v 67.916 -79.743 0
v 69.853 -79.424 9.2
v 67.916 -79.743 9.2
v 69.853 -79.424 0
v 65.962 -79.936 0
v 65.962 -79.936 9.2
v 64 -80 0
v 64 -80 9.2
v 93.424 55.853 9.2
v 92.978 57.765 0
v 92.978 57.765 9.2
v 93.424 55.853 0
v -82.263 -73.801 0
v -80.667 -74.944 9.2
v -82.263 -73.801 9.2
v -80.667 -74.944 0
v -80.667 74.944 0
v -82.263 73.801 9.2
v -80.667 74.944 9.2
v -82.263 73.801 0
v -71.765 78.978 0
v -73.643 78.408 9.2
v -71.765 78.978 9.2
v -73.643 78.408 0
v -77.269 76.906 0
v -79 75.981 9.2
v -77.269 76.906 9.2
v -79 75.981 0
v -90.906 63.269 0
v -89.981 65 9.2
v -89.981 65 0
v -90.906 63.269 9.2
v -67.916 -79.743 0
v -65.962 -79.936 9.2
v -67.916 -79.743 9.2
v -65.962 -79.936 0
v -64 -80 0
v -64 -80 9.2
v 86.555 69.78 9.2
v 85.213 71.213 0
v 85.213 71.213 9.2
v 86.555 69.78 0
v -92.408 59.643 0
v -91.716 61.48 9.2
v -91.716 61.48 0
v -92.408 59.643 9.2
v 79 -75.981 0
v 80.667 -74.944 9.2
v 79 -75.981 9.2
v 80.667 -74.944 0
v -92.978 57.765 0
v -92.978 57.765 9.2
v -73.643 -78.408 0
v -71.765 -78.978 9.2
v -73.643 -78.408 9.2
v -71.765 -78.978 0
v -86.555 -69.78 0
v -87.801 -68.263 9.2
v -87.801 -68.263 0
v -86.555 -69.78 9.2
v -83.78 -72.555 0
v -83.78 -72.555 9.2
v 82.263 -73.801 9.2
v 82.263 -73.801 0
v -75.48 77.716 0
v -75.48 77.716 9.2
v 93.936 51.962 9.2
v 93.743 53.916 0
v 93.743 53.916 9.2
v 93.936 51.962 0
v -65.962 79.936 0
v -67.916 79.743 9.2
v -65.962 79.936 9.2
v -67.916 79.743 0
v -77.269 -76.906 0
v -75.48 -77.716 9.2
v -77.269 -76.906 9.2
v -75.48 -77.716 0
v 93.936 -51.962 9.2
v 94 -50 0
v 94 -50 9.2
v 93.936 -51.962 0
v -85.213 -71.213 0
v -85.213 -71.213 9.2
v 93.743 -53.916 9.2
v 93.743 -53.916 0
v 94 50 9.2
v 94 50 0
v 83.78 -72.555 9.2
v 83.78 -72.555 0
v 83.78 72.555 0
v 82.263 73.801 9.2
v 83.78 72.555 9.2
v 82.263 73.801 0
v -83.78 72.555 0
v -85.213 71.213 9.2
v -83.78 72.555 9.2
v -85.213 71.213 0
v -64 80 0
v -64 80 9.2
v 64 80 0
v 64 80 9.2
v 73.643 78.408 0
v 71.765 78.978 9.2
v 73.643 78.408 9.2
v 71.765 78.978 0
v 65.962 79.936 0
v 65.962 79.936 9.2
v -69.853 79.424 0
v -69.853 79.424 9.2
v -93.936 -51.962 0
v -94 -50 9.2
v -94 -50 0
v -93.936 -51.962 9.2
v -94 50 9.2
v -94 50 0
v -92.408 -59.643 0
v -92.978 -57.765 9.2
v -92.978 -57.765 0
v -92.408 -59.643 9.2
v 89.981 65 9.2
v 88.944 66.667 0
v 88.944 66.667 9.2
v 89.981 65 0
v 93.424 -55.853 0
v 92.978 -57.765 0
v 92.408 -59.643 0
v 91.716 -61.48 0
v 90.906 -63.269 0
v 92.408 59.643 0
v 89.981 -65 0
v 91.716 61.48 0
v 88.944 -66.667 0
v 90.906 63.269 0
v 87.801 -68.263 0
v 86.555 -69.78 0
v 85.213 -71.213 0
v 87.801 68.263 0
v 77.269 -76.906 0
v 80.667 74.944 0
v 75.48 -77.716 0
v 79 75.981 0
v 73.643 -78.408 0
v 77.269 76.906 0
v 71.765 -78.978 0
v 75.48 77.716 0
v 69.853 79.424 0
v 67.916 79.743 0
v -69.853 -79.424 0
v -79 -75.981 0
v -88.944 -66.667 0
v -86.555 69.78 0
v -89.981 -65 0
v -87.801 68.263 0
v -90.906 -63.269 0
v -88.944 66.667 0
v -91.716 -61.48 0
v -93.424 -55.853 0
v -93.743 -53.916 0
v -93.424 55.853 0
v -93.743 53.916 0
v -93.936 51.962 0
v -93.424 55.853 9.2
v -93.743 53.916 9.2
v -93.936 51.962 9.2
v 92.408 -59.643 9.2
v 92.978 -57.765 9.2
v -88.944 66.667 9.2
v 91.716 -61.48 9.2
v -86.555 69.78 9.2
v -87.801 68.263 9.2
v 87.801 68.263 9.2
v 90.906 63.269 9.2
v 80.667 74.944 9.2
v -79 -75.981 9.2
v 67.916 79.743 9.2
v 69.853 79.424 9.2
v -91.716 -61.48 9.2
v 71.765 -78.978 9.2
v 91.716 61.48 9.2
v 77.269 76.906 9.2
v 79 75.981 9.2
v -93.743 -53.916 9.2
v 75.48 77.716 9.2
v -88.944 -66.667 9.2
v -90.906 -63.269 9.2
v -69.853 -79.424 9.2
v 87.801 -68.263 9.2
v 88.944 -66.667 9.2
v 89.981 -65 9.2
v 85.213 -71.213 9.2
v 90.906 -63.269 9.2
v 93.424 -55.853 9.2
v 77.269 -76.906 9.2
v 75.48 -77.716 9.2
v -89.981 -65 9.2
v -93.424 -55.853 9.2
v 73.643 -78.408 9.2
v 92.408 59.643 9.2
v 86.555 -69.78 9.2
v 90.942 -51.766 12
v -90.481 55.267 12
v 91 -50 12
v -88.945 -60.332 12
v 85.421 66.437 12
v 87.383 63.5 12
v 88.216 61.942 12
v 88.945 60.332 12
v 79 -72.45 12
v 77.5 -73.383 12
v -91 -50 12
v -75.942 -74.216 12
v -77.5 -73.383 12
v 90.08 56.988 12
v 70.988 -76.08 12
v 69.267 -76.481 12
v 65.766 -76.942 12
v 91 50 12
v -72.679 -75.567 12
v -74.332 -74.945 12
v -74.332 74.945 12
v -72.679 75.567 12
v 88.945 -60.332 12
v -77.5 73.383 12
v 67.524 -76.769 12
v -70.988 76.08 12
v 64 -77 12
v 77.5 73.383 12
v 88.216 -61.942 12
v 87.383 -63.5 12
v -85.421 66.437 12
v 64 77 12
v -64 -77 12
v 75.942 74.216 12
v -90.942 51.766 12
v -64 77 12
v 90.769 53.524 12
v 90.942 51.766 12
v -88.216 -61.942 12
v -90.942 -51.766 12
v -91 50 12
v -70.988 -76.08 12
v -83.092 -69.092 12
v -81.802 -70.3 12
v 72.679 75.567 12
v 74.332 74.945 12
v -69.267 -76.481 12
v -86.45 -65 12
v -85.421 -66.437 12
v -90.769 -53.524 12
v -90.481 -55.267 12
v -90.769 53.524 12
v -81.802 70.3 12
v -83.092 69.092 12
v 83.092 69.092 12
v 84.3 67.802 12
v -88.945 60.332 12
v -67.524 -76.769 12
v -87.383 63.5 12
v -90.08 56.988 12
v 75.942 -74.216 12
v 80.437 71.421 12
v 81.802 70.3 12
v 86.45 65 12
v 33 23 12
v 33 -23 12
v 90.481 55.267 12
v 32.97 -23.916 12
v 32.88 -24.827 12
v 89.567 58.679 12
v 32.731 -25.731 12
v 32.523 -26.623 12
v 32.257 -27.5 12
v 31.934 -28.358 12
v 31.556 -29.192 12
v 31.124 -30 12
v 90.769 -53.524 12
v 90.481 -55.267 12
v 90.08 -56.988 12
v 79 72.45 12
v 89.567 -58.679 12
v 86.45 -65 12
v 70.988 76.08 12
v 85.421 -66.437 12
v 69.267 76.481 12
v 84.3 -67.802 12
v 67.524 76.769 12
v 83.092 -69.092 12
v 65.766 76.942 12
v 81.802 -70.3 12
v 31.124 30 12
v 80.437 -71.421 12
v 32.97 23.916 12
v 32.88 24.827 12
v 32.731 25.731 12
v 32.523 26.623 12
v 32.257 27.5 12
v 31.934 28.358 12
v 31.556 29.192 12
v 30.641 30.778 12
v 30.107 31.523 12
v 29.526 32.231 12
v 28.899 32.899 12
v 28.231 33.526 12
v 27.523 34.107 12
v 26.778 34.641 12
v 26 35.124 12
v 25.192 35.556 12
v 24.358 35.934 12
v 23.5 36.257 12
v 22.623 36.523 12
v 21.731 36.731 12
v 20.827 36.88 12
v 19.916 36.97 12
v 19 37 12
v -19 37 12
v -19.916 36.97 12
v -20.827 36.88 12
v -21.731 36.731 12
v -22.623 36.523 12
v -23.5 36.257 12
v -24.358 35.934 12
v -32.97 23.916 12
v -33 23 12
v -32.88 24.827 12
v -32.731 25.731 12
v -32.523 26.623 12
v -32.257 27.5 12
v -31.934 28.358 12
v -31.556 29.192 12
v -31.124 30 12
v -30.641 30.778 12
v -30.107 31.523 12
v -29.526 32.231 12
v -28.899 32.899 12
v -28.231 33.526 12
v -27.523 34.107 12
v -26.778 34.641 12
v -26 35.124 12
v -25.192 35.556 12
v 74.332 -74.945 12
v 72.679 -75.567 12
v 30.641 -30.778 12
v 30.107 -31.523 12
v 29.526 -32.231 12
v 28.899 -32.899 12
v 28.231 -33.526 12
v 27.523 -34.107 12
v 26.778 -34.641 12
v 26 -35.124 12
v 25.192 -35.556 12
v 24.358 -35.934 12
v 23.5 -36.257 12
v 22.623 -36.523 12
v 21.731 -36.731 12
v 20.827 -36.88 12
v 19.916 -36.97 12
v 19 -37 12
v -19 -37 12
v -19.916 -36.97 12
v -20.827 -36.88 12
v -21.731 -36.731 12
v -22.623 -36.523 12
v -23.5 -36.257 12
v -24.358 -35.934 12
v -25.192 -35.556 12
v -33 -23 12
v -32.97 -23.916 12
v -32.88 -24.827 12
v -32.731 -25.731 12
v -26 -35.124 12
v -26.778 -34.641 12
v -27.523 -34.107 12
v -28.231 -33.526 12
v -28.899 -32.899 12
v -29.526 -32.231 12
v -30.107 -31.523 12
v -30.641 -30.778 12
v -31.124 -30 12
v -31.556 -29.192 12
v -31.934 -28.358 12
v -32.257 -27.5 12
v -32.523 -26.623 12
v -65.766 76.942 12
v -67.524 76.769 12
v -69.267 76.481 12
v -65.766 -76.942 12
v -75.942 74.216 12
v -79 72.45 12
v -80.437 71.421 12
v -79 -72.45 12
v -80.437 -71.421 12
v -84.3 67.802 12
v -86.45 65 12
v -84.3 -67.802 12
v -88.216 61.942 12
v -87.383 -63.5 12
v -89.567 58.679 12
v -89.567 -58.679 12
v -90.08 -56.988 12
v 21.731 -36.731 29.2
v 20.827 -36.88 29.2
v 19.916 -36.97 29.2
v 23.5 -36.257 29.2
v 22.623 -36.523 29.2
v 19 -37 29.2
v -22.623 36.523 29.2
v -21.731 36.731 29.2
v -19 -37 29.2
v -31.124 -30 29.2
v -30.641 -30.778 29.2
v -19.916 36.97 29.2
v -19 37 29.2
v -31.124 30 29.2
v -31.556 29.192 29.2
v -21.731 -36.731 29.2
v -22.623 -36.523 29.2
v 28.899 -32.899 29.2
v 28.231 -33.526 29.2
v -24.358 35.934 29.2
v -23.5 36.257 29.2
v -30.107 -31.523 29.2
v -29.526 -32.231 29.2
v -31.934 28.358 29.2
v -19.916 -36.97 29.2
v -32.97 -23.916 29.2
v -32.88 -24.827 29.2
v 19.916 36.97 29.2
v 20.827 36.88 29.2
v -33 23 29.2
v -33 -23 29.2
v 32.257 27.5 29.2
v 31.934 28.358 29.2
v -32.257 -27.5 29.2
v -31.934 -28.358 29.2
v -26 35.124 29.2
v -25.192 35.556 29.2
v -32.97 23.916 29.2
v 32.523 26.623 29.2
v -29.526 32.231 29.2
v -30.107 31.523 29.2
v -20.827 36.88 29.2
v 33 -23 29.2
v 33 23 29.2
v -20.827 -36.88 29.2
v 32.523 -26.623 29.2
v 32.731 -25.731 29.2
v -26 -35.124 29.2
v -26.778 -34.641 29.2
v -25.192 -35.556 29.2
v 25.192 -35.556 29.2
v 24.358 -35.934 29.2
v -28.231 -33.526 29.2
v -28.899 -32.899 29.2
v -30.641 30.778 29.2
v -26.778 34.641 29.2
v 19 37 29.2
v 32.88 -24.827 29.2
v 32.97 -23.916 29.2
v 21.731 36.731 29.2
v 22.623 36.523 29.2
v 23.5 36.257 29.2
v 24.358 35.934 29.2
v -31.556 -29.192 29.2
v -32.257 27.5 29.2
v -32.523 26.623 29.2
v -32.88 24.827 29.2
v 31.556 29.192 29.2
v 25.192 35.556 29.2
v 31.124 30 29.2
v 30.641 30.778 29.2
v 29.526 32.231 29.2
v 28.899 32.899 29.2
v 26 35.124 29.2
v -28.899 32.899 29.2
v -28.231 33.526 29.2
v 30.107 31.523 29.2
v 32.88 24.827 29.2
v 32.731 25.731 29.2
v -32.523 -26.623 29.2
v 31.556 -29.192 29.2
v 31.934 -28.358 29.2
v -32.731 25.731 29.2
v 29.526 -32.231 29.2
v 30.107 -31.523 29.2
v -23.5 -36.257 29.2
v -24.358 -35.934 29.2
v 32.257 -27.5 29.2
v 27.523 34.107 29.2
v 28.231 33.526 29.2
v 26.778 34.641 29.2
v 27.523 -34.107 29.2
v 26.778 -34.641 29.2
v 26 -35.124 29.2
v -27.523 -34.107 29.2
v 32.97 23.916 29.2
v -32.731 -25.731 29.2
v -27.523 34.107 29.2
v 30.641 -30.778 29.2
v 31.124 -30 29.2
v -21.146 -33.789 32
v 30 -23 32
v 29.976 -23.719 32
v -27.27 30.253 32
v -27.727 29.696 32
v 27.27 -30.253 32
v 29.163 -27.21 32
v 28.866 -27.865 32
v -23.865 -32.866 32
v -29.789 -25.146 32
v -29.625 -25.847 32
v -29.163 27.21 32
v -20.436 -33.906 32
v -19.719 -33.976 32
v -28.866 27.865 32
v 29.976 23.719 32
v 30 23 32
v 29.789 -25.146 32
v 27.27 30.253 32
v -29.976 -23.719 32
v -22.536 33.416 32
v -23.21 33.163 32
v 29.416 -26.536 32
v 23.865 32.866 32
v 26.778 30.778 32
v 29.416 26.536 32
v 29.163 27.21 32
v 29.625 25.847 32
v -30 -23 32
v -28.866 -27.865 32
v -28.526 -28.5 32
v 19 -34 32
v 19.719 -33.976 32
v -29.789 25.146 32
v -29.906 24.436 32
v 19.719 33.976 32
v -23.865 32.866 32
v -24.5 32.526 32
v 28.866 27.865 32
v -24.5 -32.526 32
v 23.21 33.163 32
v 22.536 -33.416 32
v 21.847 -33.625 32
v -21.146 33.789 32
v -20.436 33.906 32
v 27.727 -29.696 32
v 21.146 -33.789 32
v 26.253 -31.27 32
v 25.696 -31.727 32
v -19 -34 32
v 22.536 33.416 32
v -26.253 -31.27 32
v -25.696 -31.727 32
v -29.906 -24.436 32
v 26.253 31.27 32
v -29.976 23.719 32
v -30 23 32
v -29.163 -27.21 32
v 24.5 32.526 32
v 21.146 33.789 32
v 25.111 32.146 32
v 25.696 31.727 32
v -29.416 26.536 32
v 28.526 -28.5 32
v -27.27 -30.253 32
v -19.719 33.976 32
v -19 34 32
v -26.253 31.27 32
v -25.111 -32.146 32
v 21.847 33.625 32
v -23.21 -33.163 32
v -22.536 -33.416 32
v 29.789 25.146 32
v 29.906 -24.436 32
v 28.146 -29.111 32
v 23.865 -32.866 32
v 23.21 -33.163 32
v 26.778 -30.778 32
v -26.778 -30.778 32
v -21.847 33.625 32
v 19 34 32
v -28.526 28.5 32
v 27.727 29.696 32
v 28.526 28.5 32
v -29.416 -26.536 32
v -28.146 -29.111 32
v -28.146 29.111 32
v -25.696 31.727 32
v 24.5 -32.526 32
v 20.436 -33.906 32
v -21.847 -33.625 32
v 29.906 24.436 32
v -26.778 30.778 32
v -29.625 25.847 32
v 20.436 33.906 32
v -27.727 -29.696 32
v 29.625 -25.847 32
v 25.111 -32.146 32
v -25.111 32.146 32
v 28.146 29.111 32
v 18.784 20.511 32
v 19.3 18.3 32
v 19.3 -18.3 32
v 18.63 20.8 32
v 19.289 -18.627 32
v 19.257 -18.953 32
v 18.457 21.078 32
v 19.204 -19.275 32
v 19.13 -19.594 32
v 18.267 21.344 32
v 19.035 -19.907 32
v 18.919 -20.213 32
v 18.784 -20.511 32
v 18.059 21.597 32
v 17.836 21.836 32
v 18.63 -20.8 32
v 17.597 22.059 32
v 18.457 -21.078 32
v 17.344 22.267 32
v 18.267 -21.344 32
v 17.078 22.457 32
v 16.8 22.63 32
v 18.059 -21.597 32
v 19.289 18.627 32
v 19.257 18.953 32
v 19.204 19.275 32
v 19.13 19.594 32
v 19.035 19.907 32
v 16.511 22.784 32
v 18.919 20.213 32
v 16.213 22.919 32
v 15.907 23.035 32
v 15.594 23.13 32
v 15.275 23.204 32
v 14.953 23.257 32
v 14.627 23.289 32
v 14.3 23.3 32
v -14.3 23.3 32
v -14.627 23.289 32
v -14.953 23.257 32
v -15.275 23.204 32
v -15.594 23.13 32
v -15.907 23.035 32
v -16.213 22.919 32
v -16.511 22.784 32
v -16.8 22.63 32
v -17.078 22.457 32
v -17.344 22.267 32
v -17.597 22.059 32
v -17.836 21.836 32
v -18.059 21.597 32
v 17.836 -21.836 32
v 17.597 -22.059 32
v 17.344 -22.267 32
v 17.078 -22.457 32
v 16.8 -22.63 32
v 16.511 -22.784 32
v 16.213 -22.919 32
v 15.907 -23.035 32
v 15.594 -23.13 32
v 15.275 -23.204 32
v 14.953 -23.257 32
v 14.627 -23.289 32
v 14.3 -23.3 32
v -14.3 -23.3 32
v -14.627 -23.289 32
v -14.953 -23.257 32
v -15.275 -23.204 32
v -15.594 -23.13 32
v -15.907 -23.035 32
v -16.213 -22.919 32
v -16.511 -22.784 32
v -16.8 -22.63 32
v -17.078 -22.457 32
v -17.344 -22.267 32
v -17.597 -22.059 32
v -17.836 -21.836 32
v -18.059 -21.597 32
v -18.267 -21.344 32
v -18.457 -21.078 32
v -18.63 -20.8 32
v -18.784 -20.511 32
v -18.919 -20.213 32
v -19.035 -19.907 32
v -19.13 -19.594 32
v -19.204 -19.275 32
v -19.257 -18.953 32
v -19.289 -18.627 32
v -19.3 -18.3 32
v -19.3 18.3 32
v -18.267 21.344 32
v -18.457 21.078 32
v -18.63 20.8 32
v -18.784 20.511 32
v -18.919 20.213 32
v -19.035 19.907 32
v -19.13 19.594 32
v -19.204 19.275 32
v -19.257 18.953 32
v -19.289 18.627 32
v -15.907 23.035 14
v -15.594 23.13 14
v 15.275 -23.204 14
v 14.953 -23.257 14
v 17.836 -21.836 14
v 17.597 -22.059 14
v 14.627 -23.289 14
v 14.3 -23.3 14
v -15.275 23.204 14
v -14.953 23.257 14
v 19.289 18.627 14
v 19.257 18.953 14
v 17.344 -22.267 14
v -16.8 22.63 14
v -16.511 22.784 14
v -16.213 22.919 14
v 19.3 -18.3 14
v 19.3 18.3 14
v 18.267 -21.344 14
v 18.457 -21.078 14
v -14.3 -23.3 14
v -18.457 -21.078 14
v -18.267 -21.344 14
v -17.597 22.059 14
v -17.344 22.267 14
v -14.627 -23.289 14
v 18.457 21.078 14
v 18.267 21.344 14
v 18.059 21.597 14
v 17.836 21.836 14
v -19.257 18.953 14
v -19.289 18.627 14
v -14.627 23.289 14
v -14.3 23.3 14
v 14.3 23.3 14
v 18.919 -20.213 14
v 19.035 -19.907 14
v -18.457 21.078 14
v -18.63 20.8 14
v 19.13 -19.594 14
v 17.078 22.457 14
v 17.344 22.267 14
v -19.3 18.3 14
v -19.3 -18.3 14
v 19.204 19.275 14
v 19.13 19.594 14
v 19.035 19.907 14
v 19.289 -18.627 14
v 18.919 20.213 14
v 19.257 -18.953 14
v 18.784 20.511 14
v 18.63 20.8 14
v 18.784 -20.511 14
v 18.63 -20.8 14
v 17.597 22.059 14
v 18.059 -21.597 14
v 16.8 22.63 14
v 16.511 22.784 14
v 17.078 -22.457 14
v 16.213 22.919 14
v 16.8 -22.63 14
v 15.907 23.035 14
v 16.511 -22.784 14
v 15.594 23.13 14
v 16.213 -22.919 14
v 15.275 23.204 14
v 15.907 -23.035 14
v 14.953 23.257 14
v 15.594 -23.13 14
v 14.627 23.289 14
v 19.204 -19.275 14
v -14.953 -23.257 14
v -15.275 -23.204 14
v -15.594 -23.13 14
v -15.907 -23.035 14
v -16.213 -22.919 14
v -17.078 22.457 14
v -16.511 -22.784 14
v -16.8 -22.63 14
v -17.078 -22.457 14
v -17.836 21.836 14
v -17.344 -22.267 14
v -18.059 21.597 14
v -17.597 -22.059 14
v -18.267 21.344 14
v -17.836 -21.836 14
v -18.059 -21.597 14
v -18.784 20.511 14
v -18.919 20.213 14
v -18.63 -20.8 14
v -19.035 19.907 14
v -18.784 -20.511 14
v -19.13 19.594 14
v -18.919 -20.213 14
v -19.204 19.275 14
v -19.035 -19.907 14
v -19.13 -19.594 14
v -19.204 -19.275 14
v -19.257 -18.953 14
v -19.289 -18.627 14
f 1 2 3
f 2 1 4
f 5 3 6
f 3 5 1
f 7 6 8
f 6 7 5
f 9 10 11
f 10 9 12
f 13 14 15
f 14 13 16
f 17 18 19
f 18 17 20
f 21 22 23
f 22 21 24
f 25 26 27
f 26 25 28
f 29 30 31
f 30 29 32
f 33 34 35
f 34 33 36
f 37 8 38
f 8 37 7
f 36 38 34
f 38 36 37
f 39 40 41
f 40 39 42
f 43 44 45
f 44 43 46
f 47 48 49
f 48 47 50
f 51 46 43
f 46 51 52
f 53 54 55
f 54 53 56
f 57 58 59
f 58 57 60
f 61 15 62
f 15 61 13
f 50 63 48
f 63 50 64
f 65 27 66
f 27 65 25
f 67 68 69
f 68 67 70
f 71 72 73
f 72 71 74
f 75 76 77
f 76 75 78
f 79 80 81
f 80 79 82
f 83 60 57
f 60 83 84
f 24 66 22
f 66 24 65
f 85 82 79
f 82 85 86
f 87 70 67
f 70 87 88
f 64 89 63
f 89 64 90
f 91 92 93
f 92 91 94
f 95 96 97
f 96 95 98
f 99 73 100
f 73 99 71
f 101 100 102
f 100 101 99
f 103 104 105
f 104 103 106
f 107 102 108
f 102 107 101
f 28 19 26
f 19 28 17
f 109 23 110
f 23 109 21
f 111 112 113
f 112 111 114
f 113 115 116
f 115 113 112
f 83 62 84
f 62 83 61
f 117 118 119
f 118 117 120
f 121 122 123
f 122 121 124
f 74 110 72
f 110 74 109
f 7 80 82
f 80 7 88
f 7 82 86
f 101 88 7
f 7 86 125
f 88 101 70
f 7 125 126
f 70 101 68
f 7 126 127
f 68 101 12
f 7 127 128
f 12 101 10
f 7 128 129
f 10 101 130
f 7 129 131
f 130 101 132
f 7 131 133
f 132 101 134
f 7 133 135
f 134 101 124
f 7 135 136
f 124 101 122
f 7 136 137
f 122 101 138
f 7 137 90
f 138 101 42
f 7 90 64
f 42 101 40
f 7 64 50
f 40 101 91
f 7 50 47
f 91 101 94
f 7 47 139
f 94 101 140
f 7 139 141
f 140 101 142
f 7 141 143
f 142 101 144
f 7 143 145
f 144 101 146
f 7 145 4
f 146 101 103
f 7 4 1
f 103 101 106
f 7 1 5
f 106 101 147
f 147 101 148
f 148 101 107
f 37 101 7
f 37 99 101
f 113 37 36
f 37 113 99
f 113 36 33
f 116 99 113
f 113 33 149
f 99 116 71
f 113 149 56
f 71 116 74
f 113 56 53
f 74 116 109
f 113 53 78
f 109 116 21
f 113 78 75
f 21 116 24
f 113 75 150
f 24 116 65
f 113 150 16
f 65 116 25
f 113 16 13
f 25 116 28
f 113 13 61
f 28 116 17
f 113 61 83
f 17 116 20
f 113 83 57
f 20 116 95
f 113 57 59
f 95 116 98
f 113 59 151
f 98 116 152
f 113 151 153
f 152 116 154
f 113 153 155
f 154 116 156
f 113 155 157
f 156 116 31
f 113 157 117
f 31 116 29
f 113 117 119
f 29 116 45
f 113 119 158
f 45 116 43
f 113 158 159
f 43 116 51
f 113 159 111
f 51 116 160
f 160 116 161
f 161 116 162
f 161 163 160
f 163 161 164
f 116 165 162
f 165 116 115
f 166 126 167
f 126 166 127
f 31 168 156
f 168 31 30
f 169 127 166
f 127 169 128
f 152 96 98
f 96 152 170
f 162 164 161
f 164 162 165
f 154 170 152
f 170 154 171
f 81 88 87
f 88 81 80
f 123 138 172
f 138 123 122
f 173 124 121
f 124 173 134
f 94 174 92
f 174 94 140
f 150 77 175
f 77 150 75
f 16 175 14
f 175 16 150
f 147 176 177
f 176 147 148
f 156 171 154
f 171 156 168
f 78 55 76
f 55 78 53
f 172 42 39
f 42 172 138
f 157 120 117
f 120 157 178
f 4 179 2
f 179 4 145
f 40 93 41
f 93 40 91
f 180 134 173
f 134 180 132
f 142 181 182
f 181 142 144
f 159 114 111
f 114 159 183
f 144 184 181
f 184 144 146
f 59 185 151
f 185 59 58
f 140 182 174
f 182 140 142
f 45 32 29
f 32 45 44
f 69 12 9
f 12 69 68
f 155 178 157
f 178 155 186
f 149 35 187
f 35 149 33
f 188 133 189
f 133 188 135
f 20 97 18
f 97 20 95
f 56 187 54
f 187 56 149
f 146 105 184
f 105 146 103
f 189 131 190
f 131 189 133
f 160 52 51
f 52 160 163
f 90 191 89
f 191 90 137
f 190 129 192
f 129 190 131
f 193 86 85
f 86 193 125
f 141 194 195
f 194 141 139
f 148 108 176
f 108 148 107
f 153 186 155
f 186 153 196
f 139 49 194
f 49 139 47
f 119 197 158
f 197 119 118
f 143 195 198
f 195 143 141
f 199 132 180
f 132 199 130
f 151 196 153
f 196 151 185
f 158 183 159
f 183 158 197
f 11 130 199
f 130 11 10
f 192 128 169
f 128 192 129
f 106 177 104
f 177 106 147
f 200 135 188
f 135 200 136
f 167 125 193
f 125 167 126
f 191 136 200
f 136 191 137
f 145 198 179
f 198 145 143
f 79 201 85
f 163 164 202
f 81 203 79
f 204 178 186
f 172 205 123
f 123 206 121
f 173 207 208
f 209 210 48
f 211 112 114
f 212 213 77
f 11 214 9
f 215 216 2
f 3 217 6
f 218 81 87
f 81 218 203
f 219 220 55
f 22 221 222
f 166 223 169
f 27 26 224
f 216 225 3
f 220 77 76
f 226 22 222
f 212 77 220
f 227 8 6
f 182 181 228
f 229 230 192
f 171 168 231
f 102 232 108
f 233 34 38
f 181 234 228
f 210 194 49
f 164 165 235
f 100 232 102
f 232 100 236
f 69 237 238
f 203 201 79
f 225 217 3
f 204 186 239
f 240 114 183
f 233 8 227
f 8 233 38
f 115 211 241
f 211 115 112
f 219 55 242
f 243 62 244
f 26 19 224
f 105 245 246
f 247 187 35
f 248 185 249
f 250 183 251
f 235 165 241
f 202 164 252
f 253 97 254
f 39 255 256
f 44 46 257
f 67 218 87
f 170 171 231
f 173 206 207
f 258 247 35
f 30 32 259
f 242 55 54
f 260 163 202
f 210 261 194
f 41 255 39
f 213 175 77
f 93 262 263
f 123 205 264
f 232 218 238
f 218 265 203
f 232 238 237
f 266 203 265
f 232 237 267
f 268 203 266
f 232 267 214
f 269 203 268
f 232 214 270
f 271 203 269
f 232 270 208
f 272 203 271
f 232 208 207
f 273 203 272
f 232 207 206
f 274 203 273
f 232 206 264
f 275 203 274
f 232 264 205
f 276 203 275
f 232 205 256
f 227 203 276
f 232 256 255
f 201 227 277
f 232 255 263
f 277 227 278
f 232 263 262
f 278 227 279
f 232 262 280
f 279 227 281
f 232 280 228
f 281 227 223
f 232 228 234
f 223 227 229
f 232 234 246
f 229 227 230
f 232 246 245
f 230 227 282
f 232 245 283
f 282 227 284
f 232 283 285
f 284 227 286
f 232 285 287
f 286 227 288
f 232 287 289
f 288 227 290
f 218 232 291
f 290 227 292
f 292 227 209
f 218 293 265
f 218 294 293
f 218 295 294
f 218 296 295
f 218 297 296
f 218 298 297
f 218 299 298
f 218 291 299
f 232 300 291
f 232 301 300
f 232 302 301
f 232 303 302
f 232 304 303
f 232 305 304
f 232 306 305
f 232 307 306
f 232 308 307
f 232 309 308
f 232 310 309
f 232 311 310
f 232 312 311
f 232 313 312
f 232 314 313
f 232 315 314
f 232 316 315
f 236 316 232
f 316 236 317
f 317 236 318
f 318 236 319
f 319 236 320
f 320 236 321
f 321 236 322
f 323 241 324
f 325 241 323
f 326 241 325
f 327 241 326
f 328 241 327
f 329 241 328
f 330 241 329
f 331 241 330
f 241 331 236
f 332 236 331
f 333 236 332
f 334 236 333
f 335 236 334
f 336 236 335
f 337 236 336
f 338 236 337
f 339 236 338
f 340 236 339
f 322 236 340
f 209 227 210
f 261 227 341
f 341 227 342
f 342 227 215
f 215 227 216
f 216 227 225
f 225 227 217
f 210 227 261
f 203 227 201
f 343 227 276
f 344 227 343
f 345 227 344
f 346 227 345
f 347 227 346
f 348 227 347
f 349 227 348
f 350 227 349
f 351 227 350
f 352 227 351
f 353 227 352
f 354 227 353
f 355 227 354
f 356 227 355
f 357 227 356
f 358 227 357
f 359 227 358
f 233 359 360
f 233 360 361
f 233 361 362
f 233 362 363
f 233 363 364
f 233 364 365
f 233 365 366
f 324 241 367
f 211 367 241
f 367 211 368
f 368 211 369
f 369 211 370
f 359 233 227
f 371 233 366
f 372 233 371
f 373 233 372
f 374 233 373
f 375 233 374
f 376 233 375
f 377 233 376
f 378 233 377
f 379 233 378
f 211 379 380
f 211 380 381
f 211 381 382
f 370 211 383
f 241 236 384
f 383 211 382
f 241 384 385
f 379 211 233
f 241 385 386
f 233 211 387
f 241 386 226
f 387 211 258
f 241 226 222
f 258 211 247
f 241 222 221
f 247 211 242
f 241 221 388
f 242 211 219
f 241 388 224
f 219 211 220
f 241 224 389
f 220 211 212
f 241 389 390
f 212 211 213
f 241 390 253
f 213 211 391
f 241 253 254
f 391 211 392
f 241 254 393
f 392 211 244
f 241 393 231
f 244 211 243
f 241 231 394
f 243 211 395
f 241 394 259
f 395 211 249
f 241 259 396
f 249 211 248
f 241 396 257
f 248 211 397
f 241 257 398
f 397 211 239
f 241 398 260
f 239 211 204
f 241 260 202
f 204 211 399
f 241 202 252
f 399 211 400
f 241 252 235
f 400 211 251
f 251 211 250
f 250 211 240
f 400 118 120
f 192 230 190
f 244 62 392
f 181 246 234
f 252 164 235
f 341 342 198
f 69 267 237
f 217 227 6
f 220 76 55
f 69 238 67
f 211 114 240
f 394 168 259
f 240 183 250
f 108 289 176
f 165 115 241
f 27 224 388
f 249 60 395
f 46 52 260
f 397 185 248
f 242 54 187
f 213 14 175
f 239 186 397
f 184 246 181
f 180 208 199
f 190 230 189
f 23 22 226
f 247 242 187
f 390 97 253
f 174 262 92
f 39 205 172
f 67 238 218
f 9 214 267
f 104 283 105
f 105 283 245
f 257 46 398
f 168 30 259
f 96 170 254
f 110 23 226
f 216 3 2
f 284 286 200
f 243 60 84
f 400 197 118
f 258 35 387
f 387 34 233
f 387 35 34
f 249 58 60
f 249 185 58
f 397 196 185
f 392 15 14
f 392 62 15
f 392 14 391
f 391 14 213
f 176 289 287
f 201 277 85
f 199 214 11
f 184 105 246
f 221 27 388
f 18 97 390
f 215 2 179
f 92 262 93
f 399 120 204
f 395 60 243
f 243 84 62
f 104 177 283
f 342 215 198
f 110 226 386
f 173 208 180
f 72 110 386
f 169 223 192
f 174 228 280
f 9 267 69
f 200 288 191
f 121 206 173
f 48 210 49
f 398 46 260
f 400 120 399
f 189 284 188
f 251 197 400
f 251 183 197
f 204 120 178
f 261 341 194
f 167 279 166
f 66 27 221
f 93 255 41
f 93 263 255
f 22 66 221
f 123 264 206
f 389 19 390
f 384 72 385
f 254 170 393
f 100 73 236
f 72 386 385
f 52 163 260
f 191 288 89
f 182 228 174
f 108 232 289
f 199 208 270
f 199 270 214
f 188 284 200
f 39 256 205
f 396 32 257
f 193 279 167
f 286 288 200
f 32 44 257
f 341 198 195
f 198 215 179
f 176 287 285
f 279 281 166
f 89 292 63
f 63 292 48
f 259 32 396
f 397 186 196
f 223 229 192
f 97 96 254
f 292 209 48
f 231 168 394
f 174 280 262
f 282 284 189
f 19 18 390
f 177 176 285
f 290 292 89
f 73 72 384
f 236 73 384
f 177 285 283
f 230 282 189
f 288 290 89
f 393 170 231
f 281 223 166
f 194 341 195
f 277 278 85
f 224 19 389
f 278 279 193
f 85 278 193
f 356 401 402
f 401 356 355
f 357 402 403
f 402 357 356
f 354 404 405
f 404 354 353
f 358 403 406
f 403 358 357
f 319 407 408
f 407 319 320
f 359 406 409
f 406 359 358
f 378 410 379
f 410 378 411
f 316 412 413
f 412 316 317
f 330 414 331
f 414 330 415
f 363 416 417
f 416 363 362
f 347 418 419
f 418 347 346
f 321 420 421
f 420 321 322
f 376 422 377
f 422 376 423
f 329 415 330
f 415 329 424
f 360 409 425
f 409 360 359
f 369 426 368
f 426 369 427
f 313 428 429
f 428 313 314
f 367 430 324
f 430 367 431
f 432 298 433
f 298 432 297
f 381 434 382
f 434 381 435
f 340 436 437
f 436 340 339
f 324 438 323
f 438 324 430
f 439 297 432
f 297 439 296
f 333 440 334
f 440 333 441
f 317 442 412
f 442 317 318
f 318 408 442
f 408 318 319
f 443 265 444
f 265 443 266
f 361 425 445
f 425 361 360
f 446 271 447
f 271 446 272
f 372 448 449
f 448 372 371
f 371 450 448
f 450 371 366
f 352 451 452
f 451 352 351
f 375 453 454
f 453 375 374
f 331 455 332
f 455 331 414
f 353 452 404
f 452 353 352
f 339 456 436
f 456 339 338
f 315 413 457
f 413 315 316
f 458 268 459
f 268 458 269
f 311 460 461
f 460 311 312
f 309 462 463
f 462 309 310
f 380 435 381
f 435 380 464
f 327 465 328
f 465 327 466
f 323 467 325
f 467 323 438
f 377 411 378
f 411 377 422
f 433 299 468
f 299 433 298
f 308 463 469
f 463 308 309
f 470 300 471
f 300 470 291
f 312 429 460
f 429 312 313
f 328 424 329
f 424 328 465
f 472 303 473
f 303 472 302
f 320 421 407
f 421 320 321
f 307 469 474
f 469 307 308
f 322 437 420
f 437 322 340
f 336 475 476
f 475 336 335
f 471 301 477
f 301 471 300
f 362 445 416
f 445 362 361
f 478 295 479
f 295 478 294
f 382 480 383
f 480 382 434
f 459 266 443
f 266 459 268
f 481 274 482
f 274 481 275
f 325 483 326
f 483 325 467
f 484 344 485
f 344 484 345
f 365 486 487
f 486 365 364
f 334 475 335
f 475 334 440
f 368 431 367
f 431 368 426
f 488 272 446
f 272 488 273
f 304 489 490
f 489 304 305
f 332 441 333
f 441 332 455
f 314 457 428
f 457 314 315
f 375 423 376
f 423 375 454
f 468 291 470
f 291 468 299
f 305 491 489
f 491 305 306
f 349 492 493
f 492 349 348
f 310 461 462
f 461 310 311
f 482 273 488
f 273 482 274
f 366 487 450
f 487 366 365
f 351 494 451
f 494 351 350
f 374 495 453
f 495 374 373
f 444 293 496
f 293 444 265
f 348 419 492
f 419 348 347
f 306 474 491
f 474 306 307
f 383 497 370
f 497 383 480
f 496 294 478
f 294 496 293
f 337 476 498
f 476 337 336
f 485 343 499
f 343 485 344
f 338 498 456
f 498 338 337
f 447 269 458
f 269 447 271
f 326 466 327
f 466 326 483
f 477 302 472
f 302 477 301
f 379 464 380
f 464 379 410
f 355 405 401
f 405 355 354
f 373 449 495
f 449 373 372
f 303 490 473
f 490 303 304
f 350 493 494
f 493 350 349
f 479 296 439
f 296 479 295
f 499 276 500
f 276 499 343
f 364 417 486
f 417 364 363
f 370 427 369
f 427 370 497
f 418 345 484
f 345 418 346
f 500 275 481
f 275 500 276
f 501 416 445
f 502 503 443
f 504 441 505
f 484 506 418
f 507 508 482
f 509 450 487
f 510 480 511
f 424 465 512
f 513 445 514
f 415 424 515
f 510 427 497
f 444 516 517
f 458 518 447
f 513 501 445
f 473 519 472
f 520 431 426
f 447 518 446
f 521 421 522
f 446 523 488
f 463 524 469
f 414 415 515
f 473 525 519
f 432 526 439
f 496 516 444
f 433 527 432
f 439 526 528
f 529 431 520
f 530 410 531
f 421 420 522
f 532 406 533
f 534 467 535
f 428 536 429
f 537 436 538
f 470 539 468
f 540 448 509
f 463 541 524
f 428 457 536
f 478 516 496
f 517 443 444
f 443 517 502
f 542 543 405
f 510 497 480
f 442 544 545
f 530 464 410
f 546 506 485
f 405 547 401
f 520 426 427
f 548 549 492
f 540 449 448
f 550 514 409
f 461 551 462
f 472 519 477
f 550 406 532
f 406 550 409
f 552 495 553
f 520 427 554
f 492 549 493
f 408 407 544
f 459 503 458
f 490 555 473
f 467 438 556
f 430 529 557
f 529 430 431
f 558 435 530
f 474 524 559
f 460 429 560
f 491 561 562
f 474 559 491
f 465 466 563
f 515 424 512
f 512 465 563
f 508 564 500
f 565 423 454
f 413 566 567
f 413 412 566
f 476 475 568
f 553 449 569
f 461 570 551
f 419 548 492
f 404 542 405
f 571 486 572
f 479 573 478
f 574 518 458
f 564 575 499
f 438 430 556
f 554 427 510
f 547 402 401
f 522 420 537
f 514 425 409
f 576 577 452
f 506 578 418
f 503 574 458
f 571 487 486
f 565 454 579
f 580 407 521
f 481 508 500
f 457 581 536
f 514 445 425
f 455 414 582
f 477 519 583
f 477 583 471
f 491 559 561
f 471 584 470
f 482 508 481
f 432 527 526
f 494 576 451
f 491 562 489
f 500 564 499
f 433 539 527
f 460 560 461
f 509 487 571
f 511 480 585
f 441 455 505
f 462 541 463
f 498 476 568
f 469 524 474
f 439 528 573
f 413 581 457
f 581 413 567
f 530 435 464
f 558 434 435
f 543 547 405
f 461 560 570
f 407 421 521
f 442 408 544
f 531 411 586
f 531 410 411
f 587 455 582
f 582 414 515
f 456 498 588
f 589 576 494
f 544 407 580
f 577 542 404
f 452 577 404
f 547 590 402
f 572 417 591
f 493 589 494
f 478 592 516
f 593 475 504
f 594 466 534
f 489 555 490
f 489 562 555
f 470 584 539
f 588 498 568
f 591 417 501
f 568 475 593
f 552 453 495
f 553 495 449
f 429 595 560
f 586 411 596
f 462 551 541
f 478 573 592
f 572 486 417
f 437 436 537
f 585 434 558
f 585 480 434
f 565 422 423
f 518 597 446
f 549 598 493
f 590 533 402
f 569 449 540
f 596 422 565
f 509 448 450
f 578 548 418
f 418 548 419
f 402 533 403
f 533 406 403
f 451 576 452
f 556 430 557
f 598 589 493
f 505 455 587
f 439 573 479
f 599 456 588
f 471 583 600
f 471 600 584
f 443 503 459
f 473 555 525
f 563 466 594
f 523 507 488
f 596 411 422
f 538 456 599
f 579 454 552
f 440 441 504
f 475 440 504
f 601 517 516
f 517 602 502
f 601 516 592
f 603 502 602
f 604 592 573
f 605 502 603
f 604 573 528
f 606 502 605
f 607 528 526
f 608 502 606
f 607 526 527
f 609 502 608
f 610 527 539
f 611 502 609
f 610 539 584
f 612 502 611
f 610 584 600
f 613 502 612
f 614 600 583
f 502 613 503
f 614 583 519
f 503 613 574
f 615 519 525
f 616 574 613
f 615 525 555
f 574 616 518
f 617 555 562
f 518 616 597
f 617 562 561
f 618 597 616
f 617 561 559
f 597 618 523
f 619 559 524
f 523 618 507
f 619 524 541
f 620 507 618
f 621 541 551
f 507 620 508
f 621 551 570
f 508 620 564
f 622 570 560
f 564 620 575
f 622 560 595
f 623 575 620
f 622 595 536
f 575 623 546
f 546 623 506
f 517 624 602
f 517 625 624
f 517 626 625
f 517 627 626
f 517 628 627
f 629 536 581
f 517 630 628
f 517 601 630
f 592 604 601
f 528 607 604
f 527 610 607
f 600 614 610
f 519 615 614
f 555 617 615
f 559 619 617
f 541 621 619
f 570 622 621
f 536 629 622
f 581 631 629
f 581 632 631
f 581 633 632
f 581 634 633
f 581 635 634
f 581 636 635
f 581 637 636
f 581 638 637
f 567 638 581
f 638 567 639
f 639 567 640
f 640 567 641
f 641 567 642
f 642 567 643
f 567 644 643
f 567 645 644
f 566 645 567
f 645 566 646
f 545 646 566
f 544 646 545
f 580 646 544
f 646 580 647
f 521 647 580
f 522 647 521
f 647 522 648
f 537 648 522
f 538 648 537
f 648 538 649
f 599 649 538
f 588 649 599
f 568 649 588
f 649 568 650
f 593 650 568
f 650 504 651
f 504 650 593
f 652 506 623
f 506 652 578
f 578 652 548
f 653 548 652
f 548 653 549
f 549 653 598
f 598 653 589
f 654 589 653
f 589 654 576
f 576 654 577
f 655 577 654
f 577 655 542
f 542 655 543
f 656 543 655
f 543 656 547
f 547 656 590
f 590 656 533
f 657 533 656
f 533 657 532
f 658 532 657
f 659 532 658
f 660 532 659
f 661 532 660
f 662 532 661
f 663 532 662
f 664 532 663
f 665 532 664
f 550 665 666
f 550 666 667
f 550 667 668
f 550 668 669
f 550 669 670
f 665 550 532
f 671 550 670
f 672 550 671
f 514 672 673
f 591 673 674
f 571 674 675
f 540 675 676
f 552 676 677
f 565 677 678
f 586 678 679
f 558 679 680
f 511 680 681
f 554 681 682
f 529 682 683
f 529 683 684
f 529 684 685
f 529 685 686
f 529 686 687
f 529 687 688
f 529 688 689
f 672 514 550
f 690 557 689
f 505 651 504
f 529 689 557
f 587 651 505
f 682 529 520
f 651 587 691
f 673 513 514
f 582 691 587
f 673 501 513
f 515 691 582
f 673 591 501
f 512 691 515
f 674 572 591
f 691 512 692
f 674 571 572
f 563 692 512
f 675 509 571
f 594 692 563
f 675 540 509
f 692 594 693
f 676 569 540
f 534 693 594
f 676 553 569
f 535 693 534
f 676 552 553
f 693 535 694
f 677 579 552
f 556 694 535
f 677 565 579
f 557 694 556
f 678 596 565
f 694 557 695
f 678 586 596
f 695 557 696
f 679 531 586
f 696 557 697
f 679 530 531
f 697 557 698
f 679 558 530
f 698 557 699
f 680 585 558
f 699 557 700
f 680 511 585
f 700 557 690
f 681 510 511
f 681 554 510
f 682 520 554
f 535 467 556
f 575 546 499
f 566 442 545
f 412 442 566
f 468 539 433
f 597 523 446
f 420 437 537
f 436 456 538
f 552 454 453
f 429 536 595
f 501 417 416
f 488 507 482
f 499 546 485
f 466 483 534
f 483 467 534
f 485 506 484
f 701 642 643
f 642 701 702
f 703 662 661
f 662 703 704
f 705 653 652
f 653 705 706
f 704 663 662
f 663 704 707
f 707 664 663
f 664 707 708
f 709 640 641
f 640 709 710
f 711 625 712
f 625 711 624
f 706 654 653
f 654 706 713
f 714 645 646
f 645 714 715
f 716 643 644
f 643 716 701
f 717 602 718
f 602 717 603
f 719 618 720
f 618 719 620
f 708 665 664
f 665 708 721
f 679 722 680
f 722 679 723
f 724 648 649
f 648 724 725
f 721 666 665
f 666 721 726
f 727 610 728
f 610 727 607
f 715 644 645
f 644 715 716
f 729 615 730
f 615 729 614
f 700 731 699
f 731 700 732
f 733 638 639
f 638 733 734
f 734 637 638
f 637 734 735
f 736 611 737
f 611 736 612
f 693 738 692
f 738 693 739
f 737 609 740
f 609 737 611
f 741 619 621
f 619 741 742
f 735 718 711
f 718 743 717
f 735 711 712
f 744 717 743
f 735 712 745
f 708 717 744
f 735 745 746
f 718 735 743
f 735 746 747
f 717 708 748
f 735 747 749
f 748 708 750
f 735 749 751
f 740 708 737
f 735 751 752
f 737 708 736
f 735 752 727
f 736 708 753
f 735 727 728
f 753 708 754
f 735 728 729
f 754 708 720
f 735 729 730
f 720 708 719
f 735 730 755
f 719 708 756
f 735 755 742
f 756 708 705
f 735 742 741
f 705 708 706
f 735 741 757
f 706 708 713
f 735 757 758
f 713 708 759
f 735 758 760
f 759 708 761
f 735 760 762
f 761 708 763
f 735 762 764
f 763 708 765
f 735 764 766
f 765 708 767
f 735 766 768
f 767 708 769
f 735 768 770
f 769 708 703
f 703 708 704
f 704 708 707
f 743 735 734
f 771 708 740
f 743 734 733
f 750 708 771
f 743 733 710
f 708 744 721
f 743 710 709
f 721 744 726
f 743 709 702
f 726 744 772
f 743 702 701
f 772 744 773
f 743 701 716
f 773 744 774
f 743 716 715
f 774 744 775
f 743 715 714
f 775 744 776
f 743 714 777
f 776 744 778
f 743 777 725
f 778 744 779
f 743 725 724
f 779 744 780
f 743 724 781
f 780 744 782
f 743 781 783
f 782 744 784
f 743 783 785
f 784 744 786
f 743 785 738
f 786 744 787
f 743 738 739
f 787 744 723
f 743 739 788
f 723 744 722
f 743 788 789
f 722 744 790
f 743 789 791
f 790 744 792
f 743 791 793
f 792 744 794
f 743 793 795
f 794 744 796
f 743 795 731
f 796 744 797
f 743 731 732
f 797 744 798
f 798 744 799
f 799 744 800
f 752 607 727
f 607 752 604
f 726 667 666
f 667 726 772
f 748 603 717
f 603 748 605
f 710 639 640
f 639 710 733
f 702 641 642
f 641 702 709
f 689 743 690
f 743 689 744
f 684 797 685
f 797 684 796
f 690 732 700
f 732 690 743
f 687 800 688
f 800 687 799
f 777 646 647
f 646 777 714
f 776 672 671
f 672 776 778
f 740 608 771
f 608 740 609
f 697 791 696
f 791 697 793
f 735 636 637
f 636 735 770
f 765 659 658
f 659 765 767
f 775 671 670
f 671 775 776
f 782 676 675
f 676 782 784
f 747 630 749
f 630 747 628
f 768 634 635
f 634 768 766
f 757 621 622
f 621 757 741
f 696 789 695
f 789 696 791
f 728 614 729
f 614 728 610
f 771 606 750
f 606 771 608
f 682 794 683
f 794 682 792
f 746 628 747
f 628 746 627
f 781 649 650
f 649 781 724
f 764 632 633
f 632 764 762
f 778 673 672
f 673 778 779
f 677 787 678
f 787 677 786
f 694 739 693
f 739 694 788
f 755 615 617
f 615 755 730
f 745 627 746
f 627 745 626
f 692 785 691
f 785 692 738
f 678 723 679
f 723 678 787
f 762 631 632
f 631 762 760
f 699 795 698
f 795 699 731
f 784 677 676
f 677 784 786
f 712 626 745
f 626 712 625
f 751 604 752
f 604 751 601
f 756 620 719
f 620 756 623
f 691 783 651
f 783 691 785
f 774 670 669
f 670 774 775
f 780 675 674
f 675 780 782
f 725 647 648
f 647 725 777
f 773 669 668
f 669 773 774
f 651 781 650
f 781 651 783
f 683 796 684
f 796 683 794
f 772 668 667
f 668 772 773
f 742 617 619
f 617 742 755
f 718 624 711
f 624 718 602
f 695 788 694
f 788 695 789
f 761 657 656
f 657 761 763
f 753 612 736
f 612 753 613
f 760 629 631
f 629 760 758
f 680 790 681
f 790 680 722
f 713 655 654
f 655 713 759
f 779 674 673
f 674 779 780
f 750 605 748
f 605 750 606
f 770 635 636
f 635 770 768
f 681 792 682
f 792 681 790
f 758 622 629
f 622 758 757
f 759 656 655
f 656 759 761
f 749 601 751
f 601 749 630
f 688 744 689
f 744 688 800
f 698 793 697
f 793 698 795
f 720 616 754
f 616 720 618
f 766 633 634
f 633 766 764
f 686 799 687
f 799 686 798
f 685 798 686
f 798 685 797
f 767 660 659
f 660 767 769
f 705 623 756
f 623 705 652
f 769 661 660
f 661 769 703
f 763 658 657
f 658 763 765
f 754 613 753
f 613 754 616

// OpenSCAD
// Headphone stand in three printable parts: base, post, hanger.
// No glue, no screws. Rectangular (non-round) blade tenons prevent spinning.
// All dimensions in mm. Print orientation is the exported orientation (+Z up).
//
// Assembly heights (assembly coordinates, desk at z=0):
//   base plate/boss top        0 .. 32
//   post                       14.5 .. 250  (17.5 mm of it inside the base socket)
//   hanger tenon               228.5 .. 250 (21.5 mm inside the post socket)
//   hanger saddle top centre   270
// Socket clearances: 0.3 mm per side (socket is tenon + 0.6 in each dimension),
// tenon tips stop 0.5 mm above socket floors; shoulders/faces give the depth stop
// for the hanger, and the post bottoms in its socket.

part = "base"; // [base, post, hanger, assembly]
cadverify_only = "";

$fn = 96;

/* [Base] */
base_w = 188;          // desk footprint, X
base_d = 160;          // desk footprint, Y
base_plate_top = 9;    // straight plate wall up to here, then 45 deg chamfer to 12
base_top_plate = 12;
boss_w = 66;
boss_d = 74;
boss_straight_top = 29; // then 45 deg chamfer to boss_top
boss_top = 32;
base_socket_w = 38.6;  // post 38 + 0.6
base_socket_d = 46.6;  // post 46 + 0.6
base_socket_floor = 14;

/* [Post] */
post_w = 38;
post_d = 46;
post_len = 235.5;      // tip (local z=0) to top (assembly 250)
post_top_socket_w = 24.6; // hanger tenon 24 + 0.6
post_top_socket_d = 34.6; // hanger tenon 34 + 0.6
post_top_socket_floor_local = 213.5; // assembly 228

/* [Hanger, modelled in print coordinates] */
// Print coordinates: X = saddle length, Y = height above tenon tip,
// Z = saddle width direction (part lies on its Z=0 side face on the bed).
hang_len_half = 69;    // overall saddle half length incl. rounded end point
hang_width = 34;       // >= 30 mm headband support width
hang_top_rel = 41.5;   // tenon tip to saddle crown; assembly 228.5 + 41.5 = 270
hang_arc_r = 170;      // crown radius of the headband contact surface
hang_plate_t = 10;     // saddle plate thickness (vertical, in profile)
hang_tenon_half_w = 12;  // tenon is 24 (X) x 34 (width)
hang_shoulder_rel = 21.5; // assembly 250, post top
hang_neck_half_w = 17;

function hang_top_z(x) = hang_top_rel - (hang_arc_r - sqrt(hang_arc_r*hang_arc_r - x*x));
function hang_bot_z(x) = hang_top_z(x) - hang_plate_t;

module rounded_rect(w, d, r) {
    offset(r = r) square([w - 2*r, d - 2*r], center = true);
}

module instance(name, part_name, unit = 1) {
    echo(cadverify_instance = [name, part_name, unit]);
    if (cadverify_only == "" || cadverify_only == name) children();
}

/* ---------- BASE (print = assembly orientation) ---------- */
module base_part() {
    difference() {
        // Outer corners of the plate and boss are rounded in plan view (corner
        // radius >= 6 mm) and the top rims have 45 deg x 3 mm chamfers, so
        // nothing sticks out beyond the bounding box or the support plane.
        union() {
            // desk plate with 45 deg top edge chamfer
            linear_extrude(base_plate_top) rounded_rect(base_w, base_d, 30);
            hull() {
                translate([0, 0, base_plate_top]) linear_extrude(0.2)
                    rounded_rect(base_w, base_d, 30);
                translate([0, 0, base_top_plate - 0.2]) linear_extrude(0.2)
                    rounded_rect(base_w - 6, base_d - 6, 27);
            }
            // raised boss / collar around the post socket, 45 deg top chamfer
            translate([0, 0, base_top_plate])
                linear_extrude(boss_straight_top - base_top_plate)
                    rounded_rect(boss_w, boss_d, 14);
            hull() {
                translate([0, 0, boss_straight_top]) linear_extrude(0.2)
                    rounded_rect(boss_w, boss_d, 14);
                translate([0, 0, boss_top - 0.2]) linear_extrude(0.2)
                    rounded_rect(boss_w - 6, boss_d - 6, 11);
            }
        }
        // blind rectangular socket for the post (stops post spinning)
        translate([0, 0, base_socket_floor])
            linear_extrude(boss_top - base_socket_floor + 2)
                rounded_rect(base_socket_w, base_socket_d, 5);
    }
}

/* ---------- POST (printed upright, local z=0 is tenon tip) ---------- */
module post_part() {
    difference() {
        // Solid rectangular column, corners rounded 8 mm in plan view.
        linear_extrude(post_len) rounded_rect(post_w, post_d, 8);
        // Blind rectangular socket in the top for the hanger blade tenon:
        // tenon + 0.6 mm per side (0.3 mm clearance); the non-round rectangle
        // is what stops the hanger spinning on the post.
        translate([0, 0, post_top_socket_floor_local])
            linear_extrude(post_len - post_top_socket_floor_local + 2)
                rounded_rect(post_top_socket_w, post_top_socket_d, 5);
    }
}

/* ---------- HANGER (printed on its side) ---------- */
module hanger_part() {
    top_pts    = [for (x = [56 : -8 : -56]) [x, hang_top_z(x)]];
    bot_r_pts  = [for (x = [48 : 8 : 64]) [x, hang_bot_z(x)]];
    bot_l_pts  = [for (x = [-64 : 8 : -48]) [x, hang_bot_z(x)]];
    mid64 = (hang_top_z(64) + hang_bot_z(64)) / 2;
    // Saddle/neck profile above the shoulder plane (print y = hang_shoulder_rel).
    profile = concat(
        [[-hang_neck_half_w, hang_shoulder_rel], [hang_neck_half_w, hang_shoulder_rel],
         [30, hang_bot_z(30)]],
        bot_r_pts,
        [[hang_len_half - 0.5, mid64], [64, hang_top_z(64)]],
        top_pts,
        [[-64, hang_top_z(64)], [-(hang_len_half - 0.5), mid64], [-64, hang_bot_z(64)]],
        bot_l_pts,
        [[-30, hang_bot_z(30)]]
    );
    difference() {
        union() {
            linear_extrude(hang_width) polygon(profile);
            // Blade tenon below the shoulder: 24 x 34 with 3 mm 45 deg corner
            // chamfers (not radii, so no near-horizontal surface floats above
            // the bed-side face when printed on its side). It clears the post
            // socket's 5 mm rounded corners and reaches 2 mm up into the neck
            // so the union is volumetric, not face-only.
            translate([0, 0, hang_width/2]) rotate([-90, 0, 0])
                linear_extrude(hang_shoulder_rel + 2)
                    polygon([[-9, -17], [9, -17], [12, -14], [12, 14],
                             [9, 17], [-9, 17], [-12, 14], [-12, -14]]);
        }
        // 45 deg chamfers on the two crown side edges, tangent to the crown
        // arc at |x| = 26 (hang_top_z(26) = crown - 2.0 mm). Each box is the
        // half-space beyond its chamfer plane, rotated -45 deg about X from
        // an origin on the plane:
        //   far side keeps Y + Z <= hang_top_z(26) + hang_width
        //   bed side keeps Y - Z <= hang_top_z(26)
        // Beyond |x| = 26 the plate keeps its full 34 mm width; at the crown
        // the two 45 deg breaks leave a 30.0 mm wide flat top (>= 30 mm for
        // the headband), and the arc gives the rounded profile. The bed-side
        // chamfer face itself is exactly 45 deg, so no supports are needed.
        translate([0, hang_top_z(26), hang_width]) rotate([-45, 0, 0])
            translate([-26, 0, 0]) cube([52, 40, 40]);
        translate([0, hang_top_z(26), 0]) rotate([-45, 0, 0])
            translate([-26, 0, 0]) cube([52, 40, 40]);
    }
}

/* ---------- Spec echoes ---------- */
if (part == "base") {
    echo(cadverify_spec = [
        ["bounds", [[-base_w/2, -base_d/2, 0], [base_w/2, base_d/2, boss_top]]],
        ["bodies", 1],
        ["through_holes", 0],
        ["support_faces", [["desk", "-z", 25000]]],
        ["overhangs_allowed", []],
        ["copies", 1],
        ["details", [
            ["plate", "material", [[-80, -60, 2], [80, 60, 10]], 0.99],
            ["boss_wall", "material", [[22, -30, 16], [31, 30, 28]], 0.99],
            ["post_socket", "void", [[-17, -21, 16], [17, 21, 30]], 0.99],
            ["socket_floor", "thickness", [0, 0, 42], [0, 0, -1], base_socket_floor],
            ["boss_socket_top", "view", [[-34, -38, 27], [34, 38, boss_top]]]
        ]]
    ]);
} else if (part == "post") {
    echo(cadverify_spec = [
        ["bounds", [[-post_w/2, -post_d/2, 0], [post_w/2, post_d/2, post_len]]],
        ["bodies", 1],
        ["through_holes", 0],
        ["support_faces", [["bed", "-z", 1500]]],
        ["overhangs_allowed", []],
        ["copies", 1],
        ["details", [
            ["column", "material", [[-16, -20, 30], [16, 20, 200]], 0.99],
            ["hanger_socket", "void", [[-10, -15, 216], [10, 15, 234]], 0.99],
            ["column_width", "thickness", [32, 0, 100], [-1, 0, 0], post_w],
            ["column_depth_46", "thickness", [0, 35, 100], [0, -1, 0], post_d],
            ["top_socket", "view", [[-19, -23, 210], [19, 23, post_len]]]
        ]]
    ]);
} else if (part == "hanger") {
    // actual extreme points are the saddle end tips at +-(hang_len_half - 0.5)
    echo(cadverify_spec = [
        ["bounds", [[-(hang_len_half - 0.5), 0, 0], [hang_len_half - 0.5, hang_top_rel, hang_width]]],
        ["bodies", 1],
        ["through_holes", 0],
        ["support_faces", [["bed", "-z", 1200]]],
        ["overhangs_allowed", [
            ["45deg crown chamfer on bed side", [[-36, 37, 0], [36, hang_top_rel, 5]]]
        ]],
        ["copies", 1],
        ["details", [
            ["saddle_plate", "material", [[-25, 32, 5], [25, 38, 29]], 0.99],
            ["tenon", "material", [[-10, 2, 5], [10, 20, 29]], 0.99],
            ["tenon_width_24", "thickness", [20, 10, 17], [-1, 0, 0], 24],
            ["tenon_depth_34", "thickness", [0, 10, 50], [0, 0, -1], 34],
            ["crown_flat_30", "thickness", [0, 41.45, 50], [0, 0, -1], 30],
            ["saddle_full_width_34", "thickness", [40, 35, 50], [0, 0, -1], 34],
            ["saddle_thickness", "thickness", [50, 52, 17], [0, -1, 0], hang_plate_t],
            ["rounded_crown", "view", [[-40, 27, 0], [40, hang_top_rel, hang_width]]]
        ]]
    ]);
} else if (part == "assembly") {
    echo(cadverify_spec = [
        ["bounds", [[-base_w/2, -base_d/2, 0], [base_w/2, base_d/2, 270]]],
        ["support_faces", [["desk", "-z", 25000]]],
        ["allowed_interferences", []],
        ["assembly_order", [
            [["base"], [0, 0, 0]],
            [["post"], [0, 0, -1]],
            [["hanger"], [0, 0, -1]]
        ]]
    ]);
}

/* ---------- Output ---------- */
if (part == "base") {
    base_part();
} else if (part == "post") {
    post_part();
} else if (part == "hanger") {
    hanger_part();
} else if (part == "assembly") {
    instance("base", "base") base_part();
    instance("post", "post") translate([0, 0, 14.5]) post_part();
    // hanger print coords (x, y=height rel. tenon tip, z=width)
    //   -> assembly (x, 17-z, 228.5+y): tenon tip at 228.5, crown at 270
    instance("hanger", "hanger")
        translate([0, hang_width/2, 228.5]) rotate([90, 0, 0]) hanger_part();
} else {
    assert(false, str("unknown part: ", part));
}
